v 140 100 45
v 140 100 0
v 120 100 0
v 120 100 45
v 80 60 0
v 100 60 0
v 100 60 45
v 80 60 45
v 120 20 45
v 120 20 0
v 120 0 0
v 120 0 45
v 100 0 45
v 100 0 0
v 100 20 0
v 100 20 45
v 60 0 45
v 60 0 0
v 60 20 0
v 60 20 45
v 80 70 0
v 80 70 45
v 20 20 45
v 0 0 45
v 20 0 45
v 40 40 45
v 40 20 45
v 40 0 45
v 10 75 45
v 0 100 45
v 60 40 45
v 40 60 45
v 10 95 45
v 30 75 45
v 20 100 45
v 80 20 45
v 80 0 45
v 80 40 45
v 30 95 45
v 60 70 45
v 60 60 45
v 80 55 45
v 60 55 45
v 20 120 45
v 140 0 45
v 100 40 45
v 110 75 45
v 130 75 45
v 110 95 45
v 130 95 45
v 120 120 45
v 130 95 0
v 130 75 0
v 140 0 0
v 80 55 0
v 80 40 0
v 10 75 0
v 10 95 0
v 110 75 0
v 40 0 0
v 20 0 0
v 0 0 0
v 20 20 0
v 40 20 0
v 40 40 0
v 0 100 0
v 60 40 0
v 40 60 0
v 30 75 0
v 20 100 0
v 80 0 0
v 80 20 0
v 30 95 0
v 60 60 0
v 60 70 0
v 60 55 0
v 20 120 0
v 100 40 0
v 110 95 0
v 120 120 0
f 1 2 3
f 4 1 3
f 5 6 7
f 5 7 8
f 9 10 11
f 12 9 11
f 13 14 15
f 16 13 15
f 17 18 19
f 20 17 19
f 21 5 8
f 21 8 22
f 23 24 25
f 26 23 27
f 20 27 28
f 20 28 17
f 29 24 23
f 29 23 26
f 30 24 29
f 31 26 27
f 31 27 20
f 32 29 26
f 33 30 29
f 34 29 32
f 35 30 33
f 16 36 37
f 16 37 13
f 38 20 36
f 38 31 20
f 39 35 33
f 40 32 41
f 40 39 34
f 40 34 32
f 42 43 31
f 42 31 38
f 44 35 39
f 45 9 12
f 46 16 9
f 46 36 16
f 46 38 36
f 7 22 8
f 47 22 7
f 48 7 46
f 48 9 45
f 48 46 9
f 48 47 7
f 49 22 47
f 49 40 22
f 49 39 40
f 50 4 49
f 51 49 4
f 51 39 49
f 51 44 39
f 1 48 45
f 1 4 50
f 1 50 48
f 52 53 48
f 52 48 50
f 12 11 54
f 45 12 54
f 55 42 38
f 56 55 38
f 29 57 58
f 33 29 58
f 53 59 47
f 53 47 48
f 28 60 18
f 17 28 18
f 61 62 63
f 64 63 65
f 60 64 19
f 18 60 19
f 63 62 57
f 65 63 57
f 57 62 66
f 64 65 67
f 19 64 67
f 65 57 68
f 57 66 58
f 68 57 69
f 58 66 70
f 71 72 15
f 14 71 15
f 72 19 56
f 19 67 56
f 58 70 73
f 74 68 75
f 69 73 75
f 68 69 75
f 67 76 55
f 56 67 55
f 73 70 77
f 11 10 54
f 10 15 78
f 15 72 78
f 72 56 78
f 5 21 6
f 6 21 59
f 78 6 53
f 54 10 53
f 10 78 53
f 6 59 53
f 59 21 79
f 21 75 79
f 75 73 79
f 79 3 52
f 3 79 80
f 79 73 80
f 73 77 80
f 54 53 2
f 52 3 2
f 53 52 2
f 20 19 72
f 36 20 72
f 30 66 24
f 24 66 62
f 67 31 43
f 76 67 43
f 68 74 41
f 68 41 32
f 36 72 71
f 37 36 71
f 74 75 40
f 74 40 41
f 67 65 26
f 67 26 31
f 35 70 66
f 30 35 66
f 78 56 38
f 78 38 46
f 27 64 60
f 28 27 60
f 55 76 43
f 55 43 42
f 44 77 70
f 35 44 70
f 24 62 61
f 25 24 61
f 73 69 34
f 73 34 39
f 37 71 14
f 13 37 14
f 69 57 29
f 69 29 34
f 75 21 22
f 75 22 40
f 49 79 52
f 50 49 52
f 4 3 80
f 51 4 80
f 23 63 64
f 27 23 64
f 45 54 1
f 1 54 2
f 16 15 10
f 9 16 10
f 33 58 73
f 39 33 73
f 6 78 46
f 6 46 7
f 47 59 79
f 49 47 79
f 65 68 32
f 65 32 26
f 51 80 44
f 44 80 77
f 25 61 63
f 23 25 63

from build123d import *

# Parameters (mm, degrees)
SKETCH1_W      = 20
SKETCH1_H      = 20
EXTRUDE1_DEPTH = 45


with BuildPart() as part:
    # Sketch1 → Extrude1 (new body)
    with BuildSketch(Plane.XY):
        Polygon((20, 0), (20, 20), (40, 20), (40, 0), (60, 0), (60, 20), (80, 20), (80, 0), (100, 0), (100, 20), (120, 20), (120, 0), (140, 0), (140, 100), (120, 100), (120, 120), (20, 120), (20, 100), (0, 100), (0, 0), align=None)
        with Locations((20, 85)):
            Rectangle(SKETCH1_W, SKETCH1_H, mode=Mode.SUBTRACT)
        with Locations((120, 85)):
            Rectangle(SKETCH1_W, SKETCH1_H, mode=Mode.SUBTRACT)
        Polygon((40, 40), (60, 40), (60, 55), (80, 55), (80, 40), (100, 40), (100, 60), (80, 60), (80, 70), (60, 70), (60, 60), (40, 60), align=None, mode=Mode.SUBTRACT)
    extrude(amount=EXTRUDE1_DEPTH)


solid = part.part
